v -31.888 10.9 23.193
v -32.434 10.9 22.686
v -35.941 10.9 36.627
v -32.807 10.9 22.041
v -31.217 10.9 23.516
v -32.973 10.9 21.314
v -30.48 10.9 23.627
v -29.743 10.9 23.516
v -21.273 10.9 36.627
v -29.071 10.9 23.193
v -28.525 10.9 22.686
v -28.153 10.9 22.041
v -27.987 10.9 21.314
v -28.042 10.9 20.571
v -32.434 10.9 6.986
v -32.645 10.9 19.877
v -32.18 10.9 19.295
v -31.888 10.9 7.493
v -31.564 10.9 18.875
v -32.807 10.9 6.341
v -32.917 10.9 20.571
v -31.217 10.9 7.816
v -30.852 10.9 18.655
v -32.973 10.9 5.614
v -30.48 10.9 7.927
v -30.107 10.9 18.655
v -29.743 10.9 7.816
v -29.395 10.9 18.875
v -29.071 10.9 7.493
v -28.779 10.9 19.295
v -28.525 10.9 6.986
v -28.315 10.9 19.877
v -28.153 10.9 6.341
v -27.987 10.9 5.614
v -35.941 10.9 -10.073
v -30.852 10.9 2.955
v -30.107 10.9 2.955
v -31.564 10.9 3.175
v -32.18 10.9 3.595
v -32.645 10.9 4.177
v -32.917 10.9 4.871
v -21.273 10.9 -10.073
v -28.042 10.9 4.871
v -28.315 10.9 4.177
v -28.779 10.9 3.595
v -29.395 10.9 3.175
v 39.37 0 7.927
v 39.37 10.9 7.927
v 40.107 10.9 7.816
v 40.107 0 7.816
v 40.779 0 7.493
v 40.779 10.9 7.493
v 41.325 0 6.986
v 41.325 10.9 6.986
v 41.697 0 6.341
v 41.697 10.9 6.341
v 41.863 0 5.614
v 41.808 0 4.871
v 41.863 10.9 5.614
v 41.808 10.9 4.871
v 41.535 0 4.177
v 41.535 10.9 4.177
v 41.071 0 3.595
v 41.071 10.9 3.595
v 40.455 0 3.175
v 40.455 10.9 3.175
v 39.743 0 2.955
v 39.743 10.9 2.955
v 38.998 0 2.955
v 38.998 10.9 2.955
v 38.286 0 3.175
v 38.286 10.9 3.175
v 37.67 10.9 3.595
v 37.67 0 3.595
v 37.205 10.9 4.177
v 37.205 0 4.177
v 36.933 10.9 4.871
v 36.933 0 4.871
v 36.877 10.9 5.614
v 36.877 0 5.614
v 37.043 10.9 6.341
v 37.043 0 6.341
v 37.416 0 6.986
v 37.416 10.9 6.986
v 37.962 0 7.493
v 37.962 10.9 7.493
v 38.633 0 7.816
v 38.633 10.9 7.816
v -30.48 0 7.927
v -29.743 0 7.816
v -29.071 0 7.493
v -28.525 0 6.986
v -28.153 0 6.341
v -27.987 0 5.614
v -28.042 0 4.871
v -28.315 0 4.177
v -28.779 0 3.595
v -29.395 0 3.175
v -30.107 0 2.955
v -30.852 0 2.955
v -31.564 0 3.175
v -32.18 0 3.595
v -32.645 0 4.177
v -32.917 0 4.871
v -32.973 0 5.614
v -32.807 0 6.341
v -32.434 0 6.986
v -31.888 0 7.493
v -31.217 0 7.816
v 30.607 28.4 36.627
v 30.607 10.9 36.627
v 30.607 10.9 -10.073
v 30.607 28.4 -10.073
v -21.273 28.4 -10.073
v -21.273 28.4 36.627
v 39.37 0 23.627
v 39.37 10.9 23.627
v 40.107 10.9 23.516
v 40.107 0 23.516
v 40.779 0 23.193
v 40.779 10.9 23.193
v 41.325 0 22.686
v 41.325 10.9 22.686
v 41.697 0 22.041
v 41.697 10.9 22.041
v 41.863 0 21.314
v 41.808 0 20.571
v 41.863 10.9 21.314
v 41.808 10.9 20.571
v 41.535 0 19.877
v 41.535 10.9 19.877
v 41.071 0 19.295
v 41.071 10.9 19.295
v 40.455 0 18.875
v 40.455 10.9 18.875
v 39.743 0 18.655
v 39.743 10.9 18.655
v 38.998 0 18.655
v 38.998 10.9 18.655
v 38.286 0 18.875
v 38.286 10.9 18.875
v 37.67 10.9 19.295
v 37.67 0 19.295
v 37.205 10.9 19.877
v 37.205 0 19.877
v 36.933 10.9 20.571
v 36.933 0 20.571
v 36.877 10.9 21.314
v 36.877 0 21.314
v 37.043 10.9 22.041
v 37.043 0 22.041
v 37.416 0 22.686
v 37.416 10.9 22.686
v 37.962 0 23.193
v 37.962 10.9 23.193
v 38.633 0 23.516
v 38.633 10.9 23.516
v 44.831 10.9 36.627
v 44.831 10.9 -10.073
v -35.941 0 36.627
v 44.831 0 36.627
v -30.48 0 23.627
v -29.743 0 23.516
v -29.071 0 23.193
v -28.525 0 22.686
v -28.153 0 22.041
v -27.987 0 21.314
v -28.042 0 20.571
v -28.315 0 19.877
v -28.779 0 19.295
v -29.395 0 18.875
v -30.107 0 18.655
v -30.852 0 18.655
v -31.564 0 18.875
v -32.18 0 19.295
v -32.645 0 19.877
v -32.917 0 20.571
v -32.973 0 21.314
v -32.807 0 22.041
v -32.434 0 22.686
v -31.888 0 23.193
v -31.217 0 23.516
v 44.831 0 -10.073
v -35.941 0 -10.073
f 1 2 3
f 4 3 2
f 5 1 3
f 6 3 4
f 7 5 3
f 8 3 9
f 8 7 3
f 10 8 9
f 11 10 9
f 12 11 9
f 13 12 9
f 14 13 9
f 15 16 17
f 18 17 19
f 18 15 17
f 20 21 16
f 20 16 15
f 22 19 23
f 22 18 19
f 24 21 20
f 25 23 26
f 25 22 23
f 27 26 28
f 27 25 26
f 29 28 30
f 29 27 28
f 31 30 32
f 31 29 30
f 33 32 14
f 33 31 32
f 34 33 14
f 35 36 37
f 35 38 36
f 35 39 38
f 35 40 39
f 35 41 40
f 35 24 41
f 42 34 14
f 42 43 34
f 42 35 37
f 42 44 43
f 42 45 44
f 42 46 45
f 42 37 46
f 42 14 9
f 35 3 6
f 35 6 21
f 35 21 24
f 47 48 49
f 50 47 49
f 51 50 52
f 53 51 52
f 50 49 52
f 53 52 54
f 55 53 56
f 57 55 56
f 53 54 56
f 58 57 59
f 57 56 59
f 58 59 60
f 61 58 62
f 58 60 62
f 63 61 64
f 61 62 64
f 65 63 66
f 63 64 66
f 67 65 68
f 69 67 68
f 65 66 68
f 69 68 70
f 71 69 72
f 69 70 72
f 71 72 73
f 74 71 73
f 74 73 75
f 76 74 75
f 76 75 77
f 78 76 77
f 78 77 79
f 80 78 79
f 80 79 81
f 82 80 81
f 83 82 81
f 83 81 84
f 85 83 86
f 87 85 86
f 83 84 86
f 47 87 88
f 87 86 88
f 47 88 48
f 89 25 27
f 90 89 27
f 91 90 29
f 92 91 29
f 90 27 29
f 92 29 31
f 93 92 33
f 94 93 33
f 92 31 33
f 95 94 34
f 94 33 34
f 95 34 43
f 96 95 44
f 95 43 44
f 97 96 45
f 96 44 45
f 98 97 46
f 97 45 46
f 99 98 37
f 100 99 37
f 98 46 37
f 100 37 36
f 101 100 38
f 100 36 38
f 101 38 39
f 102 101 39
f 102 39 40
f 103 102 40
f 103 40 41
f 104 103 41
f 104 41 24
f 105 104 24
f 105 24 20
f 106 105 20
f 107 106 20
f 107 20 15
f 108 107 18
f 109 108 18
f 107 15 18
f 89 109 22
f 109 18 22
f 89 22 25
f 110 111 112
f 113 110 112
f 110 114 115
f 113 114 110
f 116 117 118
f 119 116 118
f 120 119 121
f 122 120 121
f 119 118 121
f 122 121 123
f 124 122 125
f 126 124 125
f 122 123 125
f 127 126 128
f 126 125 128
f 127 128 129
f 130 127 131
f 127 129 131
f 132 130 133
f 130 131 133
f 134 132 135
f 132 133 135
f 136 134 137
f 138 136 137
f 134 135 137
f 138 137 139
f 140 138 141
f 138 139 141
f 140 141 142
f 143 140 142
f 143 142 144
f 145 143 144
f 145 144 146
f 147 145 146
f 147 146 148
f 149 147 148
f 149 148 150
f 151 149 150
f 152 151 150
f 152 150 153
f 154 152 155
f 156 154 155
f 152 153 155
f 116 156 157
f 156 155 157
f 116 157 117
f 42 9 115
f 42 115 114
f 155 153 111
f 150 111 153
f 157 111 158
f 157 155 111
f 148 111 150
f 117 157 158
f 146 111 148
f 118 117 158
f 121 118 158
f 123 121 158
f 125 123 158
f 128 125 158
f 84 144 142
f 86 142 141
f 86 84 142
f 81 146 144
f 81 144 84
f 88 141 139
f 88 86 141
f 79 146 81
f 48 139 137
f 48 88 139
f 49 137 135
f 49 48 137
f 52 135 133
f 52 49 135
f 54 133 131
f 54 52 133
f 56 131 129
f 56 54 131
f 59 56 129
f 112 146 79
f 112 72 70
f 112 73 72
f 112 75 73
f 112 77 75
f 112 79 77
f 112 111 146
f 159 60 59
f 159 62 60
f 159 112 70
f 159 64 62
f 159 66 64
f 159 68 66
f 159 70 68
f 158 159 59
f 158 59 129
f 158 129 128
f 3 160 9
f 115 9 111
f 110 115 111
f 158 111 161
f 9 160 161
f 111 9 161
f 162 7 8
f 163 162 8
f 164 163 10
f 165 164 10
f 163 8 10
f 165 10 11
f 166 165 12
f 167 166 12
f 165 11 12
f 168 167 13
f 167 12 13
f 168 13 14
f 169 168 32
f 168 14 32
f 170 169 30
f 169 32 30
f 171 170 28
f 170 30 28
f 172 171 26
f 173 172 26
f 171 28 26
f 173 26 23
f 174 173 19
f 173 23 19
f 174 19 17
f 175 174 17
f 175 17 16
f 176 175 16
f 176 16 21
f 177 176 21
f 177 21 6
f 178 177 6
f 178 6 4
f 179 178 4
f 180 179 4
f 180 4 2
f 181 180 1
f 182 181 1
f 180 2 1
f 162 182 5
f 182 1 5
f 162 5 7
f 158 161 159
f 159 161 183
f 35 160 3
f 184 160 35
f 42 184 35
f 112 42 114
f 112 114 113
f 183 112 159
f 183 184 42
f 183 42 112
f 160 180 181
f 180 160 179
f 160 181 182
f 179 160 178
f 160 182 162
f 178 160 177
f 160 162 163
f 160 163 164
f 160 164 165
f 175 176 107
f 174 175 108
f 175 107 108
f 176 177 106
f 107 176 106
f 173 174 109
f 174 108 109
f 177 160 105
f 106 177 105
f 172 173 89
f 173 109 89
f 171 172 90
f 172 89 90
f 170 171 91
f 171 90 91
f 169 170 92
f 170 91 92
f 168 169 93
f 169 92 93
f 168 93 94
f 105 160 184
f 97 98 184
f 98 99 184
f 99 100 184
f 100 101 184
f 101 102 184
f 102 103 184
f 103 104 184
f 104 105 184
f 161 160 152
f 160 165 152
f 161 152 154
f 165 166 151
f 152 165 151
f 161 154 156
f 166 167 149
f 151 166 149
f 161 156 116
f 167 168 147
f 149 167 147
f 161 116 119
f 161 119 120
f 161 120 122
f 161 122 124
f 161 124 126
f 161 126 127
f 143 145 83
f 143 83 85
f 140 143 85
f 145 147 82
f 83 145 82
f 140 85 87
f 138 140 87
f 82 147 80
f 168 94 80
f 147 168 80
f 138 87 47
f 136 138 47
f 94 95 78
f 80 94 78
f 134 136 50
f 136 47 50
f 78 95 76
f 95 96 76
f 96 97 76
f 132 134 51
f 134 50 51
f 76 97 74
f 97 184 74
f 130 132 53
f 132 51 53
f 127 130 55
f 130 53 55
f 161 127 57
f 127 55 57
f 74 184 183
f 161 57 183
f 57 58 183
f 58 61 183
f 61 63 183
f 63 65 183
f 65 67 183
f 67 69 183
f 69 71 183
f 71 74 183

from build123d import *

# Parameters (mm, degrees)
SKETCH1_W           = 80.772
SKETCH1_H           = 46.7
BOSS_EXTRUDE1_DEPTH = 10.9
SKETCH3_R           = 2.5
CUT_EXTRUDE1_DEPTH  = 10.9
SKETCH8_W           = 51.8805497
SKETCH8_H           = 46.7
BOSS_EXTRUDE2_DEPTH = 17.5


with BuildPart() as part:
    # Sketch1 → Boss-Extrude1 (new body)
    with BuildSketch(Plane(origin=(0, 0, 0), x_dir=(1, 0, 0), z_dir=(0, 1, 0))):
        with Locations((4.445313725, -13.27745098)):
            Rectangle(SKETCH1_W, SKETCH1_H)
    extrude(amount=BOSS_EXTRUDE1_DEPTH)

    # Sketch3 → Cut-Extrude1 (cut)
    with BuildSketch(Plane(origin=(0, 10.9, 0), x_dir=(1, 0, 0), z_dir=(0, 1, 0))):
        with Locations(Location((-30.479686275, -5.42745098, 0), (0, 0, 270))):
            Circle(SKETCH3_R)
        with Locations(Location((-30.479686275, -21.12745098, 0), (0, 0, 270))):
            Circle(SKETCH3_R)
        with Locations(Location((39.370313725, -5.42745098, 0), (0, 0, 270))):
            Circle(SKETCH3_R)
        with Locations(Location((39.370313725, -21.12745098, 0), (0, 0, 270))):
            Circle(SKETCH3_R)
    extrude(amount=-CUT_EXTRUDE1_DEPTH, mode=Mode.SUBTRACT)

    # Sketch8 → Boss-Extrude2 (add)
    with BuildSketch(Plane(origin=(0, 10.9, 0), x_dir=(1, 0, 0), z_dir=(0, 1, 0))):
        with Locations((4.667038875, -13.27745098)):
            Rectangle(SKETCH8_W, SKETCH8_H)
    extrude(amount=BOSS_EXTRUDE2_DEPTH)


solid = part.part
